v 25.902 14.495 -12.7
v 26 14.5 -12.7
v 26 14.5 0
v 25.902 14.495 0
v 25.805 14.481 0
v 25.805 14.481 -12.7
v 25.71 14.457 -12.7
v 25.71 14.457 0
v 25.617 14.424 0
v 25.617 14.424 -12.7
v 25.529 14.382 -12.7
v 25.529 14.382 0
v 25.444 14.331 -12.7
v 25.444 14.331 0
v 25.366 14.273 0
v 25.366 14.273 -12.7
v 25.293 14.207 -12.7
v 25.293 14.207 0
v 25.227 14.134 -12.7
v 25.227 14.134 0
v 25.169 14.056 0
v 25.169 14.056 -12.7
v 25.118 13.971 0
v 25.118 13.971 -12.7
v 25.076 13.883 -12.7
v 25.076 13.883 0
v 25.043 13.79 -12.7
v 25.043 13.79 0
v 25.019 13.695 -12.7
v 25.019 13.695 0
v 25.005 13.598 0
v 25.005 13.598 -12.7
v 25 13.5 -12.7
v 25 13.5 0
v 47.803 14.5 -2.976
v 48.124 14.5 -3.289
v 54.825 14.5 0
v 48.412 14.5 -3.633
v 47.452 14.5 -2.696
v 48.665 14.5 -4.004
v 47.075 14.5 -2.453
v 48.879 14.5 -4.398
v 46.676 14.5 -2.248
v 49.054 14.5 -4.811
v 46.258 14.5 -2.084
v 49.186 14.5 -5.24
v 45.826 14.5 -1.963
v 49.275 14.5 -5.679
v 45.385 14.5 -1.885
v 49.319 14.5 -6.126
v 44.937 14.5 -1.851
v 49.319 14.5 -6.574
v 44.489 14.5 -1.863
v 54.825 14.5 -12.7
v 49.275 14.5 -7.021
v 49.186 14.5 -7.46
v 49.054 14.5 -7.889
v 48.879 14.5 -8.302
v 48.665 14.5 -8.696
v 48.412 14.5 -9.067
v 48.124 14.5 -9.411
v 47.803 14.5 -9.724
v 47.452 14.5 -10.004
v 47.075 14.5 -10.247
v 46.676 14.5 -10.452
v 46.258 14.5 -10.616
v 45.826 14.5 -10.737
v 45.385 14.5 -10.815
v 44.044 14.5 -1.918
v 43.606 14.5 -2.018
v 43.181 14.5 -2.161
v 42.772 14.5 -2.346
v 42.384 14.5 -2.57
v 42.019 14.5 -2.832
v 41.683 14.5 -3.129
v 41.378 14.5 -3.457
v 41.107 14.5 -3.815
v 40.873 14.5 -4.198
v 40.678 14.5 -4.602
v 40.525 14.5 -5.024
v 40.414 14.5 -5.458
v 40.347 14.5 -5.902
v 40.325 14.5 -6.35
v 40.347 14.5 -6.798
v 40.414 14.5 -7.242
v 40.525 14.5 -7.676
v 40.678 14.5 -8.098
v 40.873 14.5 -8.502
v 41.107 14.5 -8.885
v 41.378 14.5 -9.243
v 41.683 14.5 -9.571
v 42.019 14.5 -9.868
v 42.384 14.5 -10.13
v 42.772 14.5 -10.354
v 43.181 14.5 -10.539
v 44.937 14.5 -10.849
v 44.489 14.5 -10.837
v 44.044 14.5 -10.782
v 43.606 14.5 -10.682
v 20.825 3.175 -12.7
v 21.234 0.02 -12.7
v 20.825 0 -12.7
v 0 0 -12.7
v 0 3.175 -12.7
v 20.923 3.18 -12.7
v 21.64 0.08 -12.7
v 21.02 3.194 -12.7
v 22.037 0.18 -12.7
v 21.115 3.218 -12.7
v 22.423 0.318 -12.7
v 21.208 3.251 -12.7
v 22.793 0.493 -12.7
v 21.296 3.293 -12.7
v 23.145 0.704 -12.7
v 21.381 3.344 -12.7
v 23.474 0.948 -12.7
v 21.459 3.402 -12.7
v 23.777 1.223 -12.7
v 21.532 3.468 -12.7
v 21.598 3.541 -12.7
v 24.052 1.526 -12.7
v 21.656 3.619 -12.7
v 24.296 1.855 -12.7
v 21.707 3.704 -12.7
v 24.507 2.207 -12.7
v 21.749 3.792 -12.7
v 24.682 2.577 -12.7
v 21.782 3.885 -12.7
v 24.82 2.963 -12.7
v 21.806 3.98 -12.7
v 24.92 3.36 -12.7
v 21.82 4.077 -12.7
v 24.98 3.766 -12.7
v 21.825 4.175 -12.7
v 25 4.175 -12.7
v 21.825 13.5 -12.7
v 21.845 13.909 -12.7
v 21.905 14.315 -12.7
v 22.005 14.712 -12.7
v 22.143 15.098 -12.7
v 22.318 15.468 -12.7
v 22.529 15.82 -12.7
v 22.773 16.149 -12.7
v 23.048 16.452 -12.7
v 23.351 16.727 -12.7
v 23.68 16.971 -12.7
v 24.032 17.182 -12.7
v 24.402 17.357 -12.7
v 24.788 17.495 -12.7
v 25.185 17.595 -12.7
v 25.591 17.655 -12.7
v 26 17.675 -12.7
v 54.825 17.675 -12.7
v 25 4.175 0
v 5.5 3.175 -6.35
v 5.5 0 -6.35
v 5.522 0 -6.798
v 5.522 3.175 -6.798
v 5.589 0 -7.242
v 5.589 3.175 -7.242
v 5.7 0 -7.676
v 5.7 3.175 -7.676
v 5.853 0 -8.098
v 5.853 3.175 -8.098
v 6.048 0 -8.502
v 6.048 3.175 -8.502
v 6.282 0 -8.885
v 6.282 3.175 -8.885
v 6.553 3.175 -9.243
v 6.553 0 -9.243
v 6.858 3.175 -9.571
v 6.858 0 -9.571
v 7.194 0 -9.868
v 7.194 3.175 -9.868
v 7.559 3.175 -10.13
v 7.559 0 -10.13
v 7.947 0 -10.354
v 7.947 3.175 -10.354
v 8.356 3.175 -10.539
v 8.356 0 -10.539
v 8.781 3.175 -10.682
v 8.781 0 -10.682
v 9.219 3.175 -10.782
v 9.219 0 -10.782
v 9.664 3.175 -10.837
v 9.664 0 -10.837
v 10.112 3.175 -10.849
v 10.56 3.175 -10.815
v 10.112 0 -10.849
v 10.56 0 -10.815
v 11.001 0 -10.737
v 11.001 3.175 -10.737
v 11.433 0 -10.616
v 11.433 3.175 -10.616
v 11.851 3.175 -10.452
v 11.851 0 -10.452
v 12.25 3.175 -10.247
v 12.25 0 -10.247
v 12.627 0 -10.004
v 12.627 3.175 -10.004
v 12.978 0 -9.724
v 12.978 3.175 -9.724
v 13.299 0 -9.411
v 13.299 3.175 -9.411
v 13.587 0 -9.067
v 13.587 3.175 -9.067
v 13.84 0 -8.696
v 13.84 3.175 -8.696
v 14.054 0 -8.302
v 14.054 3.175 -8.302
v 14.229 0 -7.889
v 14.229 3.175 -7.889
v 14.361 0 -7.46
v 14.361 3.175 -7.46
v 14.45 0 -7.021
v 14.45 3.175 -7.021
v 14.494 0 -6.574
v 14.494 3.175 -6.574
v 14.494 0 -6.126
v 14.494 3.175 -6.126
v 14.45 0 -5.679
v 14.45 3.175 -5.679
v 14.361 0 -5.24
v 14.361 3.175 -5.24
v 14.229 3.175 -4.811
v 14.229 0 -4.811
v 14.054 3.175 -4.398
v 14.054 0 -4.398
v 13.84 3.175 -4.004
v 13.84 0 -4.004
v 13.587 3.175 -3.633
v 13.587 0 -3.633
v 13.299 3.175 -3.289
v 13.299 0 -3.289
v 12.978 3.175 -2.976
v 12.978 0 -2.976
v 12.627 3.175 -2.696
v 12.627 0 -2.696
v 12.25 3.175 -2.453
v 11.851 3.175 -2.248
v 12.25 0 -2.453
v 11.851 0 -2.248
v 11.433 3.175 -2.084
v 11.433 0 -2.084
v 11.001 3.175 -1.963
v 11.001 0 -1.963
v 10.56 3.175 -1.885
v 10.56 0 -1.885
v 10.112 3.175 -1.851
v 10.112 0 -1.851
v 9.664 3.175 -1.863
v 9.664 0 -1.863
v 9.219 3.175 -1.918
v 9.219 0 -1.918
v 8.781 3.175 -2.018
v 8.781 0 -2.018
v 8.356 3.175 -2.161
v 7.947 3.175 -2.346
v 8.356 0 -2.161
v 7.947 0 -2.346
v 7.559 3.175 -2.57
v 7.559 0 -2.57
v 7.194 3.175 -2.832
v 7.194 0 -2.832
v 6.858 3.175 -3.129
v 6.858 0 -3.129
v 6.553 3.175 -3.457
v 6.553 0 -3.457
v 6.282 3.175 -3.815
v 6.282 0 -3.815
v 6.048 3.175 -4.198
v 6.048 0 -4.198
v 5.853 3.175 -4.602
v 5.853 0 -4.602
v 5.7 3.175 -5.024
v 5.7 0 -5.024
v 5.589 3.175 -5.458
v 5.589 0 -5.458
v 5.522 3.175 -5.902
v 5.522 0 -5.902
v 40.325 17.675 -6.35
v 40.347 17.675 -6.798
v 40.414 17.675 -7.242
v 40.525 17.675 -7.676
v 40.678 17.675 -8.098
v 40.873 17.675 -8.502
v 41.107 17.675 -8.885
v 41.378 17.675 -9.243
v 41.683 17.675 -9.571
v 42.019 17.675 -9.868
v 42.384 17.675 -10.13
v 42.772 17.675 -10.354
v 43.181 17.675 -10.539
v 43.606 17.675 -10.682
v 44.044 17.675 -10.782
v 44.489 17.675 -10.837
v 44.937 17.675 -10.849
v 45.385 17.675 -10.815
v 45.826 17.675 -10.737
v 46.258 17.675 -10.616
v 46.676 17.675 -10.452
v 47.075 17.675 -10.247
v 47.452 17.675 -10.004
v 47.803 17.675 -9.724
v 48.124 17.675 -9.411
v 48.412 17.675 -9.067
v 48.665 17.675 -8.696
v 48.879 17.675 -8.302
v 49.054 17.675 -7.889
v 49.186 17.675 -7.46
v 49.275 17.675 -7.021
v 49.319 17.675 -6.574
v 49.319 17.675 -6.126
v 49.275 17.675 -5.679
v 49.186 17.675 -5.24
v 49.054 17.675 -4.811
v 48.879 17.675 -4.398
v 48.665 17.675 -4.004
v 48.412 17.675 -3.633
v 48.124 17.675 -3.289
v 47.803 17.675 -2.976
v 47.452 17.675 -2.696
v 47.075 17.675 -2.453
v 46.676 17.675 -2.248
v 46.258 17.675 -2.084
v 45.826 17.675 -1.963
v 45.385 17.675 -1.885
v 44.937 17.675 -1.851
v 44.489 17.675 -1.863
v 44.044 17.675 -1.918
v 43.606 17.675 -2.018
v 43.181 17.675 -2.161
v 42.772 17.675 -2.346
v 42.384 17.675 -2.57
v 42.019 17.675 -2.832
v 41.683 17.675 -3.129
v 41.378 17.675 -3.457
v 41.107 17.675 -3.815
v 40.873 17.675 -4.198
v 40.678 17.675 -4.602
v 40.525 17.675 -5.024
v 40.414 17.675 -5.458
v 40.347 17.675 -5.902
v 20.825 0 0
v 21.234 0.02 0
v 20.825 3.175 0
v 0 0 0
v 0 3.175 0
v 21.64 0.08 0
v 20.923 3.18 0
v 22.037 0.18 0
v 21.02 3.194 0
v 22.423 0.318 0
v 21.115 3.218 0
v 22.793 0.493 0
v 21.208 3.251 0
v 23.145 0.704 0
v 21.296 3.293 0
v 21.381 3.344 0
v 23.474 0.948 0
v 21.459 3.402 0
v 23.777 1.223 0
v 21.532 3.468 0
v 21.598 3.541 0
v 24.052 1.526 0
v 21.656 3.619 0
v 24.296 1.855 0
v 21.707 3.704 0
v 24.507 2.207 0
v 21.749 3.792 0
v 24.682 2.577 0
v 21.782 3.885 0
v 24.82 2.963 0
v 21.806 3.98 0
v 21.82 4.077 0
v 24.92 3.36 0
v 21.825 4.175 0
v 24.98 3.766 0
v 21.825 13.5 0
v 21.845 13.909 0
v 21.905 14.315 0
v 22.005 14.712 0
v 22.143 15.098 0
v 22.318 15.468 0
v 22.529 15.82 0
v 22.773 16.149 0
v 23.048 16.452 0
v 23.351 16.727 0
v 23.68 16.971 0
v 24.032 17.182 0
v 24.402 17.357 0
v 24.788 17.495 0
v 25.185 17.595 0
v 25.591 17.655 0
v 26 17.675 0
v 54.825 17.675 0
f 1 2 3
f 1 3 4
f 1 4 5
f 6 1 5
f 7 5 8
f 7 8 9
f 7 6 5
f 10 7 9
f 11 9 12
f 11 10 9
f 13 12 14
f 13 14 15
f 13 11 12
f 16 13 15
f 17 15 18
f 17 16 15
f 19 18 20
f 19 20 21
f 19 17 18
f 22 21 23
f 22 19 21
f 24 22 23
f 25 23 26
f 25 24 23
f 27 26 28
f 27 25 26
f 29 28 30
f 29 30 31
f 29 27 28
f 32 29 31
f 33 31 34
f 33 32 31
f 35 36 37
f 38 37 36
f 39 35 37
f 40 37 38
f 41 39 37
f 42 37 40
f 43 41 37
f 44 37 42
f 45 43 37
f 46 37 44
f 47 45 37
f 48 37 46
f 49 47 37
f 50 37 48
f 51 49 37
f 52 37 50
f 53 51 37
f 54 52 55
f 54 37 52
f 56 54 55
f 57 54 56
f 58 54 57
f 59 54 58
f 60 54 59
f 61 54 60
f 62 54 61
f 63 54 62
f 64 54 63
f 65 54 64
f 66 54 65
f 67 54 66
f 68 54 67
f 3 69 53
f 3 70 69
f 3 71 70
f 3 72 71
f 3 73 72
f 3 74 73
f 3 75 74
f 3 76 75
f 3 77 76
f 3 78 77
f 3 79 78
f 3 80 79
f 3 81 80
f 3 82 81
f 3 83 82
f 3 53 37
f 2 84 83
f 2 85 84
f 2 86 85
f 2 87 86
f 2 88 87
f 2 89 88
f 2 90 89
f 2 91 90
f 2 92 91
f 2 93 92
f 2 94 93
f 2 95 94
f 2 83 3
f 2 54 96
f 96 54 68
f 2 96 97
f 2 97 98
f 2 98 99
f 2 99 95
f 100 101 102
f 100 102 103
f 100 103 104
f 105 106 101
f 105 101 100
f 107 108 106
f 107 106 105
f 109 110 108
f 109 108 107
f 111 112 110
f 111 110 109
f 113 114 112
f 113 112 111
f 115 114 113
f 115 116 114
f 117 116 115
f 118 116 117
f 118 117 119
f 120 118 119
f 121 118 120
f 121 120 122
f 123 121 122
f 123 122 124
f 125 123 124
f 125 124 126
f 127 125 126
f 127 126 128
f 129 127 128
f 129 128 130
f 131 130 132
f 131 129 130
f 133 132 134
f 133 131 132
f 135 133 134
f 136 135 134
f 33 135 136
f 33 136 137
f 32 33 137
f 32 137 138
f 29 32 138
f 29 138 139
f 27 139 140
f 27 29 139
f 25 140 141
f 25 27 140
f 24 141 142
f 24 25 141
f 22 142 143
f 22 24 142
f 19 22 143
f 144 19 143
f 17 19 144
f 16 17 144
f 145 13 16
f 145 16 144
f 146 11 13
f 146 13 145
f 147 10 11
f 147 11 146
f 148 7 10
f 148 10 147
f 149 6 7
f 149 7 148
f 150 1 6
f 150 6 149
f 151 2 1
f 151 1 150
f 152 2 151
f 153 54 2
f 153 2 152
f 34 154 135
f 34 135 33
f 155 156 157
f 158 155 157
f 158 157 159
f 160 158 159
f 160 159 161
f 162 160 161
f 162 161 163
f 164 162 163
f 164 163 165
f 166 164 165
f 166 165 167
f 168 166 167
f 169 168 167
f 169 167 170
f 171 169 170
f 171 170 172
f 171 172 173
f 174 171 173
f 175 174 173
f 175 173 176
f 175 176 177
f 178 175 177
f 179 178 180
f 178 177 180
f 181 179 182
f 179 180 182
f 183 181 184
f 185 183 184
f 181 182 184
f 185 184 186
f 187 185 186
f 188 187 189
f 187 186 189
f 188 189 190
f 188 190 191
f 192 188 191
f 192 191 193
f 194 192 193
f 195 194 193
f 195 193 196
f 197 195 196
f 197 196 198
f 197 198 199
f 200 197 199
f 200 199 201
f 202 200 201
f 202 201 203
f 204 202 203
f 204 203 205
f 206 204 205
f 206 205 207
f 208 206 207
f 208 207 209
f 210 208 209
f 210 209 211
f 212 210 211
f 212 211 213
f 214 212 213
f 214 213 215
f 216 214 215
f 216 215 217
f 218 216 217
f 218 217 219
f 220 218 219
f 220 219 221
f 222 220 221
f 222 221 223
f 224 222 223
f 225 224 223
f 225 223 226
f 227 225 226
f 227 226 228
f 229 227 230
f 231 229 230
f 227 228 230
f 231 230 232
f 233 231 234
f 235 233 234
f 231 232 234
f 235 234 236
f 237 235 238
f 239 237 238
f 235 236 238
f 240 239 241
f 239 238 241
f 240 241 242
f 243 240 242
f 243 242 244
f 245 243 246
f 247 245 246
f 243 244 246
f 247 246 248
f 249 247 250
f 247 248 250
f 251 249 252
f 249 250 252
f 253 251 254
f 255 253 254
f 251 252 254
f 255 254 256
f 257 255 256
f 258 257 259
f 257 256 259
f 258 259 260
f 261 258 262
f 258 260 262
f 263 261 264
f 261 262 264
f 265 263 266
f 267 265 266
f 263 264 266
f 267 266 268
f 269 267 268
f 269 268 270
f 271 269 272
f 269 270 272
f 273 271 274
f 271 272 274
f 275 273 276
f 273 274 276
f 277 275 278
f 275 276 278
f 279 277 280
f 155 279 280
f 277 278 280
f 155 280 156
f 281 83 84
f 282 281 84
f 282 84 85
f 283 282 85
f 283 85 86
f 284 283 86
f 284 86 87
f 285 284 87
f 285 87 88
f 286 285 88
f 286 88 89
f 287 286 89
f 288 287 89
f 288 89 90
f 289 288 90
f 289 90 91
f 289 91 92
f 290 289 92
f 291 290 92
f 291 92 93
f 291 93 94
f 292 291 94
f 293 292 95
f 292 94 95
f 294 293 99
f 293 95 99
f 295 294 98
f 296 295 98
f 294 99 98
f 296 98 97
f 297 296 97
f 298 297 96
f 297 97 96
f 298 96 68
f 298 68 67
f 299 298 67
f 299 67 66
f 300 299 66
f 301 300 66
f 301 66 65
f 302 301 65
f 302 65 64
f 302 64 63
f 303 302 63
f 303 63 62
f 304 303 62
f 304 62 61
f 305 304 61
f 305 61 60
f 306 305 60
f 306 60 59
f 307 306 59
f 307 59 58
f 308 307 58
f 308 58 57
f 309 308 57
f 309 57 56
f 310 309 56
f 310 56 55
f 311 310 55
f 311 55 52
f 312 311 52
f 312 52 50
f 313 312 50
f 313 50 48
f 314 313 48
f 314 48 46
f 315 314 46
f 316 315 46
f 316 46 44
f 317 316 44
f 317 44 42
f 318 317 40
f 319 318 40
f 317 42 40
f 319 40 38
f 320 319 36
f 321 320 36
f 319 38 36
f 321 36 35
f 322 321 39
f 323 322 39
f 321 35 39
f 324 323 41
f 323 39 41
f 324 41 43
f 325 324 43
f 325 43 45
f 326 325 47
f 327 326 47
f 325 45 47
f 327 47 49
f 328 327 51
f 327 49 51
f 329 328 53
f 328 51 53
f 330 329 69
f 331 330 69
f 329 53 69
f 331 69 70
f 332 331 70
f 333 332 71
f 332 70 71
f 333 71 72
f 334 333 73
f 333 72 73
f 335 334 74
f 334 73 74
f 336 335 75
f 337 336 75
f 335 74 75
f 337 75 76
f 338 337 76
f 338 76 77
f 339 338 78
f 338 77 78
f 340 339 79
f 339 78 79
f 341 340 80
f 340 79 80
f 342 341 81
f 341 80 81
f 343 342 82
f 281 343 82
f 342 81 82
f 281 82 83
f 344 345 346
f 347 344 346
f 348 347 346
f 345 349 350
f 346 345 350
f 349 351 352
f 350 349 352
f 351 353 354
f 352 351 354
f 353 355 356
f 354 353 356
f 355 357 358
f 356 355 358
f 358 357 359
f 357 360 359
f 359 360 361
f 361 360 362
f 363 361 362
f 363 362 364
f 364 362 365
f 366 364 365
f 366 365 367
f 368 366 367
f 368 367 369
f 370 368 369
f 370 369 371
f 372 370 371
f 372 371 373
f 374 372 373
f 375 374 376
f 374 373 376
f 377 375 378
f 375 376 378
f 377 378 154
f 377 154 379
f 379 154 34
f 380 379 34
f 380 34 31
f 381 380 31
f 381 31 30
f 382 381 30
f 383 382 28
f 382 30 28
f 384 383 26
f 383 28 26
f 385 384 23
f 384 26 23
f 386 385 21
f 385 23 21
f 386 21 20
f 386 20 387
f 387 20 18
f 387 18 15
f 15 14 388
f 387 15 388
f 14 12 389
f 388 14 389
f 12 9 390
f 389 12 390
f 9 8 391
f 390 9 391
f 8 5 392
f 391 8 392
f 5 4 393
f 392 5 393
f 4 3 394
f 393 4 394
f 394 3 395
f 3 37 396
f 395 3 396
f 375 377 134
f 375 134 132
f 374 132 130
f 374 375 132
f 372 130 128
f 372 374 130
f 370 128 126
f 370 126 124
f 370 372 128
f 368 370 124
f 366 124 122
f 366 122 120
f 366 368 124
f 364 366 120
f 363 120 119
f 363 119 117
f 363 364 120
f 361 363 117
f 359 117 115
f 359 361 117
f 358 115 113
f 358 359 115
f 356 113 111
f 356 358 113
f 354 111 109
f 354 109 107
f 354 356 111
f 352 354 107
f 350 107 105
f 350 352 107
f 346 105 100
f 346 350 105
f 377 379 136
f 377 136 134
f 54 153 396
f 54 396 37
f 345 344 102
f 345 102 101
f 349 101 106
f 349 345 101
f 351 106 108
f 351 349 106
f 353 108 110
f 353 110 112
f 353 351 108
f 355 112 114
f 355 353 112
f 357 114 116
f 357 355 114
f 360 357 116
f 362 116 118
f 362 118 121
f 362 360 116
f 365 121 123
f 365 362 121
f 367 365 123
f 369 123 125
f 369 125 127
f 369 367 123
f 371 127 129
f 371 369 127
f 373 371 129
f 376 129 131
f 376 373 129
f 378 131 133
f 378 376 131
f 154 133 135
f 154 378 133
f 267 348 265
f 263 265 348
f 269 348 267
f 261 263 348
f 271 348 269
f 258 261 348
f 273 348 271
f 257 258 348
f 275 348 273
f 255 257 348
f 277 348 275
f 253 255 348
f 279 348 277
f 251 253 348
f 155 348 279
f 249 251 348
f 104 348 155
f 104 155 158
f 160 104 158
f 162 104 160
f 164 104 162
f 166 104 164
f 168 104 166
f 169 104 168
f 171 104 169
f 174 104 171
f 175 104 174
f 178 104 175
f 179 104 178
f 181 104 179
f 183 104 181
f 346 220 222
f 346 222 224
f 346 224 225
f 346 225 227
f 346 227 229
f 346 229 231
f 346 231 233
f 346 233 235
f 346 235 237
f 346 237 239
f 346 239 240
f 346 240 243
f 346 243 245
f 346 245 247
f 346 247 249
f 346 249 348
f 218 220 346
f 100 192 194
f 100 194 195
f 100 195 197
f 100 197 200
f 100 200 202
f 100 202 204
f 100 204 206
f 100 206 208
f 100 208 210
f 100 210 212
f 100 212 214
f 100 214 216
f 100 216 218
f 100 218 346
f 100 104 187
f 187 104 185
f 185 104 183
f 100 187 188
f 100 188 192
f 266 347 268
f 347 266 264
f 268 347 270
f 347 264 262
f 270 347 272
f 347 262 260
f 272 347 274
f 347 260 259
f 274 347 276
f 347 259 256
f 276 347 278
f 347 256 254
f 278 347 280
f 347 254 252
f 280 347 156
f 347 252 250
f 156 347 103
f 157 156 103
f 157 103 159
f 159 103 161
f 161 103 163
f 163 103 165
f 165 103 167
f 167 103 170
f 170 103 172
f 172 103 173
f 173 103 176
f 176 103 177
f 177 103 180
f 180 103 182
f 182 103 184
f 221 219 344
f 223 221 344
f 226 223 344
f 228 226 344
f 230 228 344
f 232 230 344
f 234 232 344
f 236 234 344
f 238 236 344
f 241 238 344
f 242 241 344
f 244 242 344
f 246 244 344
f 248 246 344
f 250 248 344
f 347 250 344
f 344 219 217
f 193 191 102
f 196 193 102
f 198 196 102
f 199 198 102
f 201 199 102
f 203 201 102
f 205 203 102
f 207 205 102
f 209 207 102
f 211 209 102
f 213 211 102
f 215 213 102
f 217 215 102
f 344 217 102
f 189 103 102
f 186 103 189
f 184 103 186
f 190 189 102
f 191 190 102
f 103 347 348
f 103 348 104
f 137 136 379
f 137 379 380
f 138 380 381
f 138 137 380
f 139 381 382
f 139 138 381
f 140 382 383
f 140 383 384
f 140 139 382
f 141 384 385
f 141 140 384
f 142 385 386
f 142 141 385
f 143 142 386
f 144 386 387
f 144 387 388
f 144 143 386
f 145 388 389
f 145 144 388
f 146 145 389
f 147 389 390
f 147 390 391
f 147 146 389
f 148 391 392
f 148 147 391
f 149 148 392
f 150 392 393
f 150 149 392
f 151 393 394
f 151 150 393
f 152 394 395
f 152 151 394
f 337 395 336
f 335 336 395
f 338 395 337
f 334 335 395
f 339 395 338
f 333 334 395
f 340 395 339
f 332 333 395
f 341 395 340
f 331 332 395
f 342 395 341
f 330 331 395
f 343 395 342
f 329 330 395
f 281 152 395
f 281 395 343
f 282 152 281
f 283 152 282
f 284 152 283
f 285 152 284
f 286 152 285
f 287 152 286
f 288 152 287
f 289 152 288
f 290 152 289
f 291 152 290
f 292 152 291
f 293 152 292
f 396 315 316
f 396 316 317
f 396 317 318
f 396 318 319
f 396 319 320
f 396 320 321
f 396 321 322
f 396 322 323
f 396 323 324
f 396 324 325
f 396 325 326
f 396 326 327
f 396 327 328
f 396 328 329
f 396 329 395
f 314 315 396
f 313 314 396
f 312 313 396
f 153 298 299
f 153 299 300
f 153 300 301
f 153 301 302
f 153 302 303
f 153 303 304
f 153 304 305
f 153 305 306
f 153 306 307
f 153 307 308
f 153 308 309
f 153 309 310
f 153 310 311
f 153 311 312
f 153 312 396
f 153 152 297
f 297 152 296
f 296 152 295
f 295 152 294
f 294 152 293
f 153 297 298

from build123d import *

# Parameters (mm, degrees)
SKETCH1_W                    = 25
SKETCH1_H                    = 12.7
BOSS_EXTRUDE1_DEPTH          = 3.175
EDGE_FLANGE1_STRIP_W         = 14.7
EDGE_FLANGE1_STRIP_H         = 3.175
EDGE_FLANGE1_STRIP_CUT_DEPTH = 12.7
EDGE_FLANGE1_DEPTH           = 12.7
EDGE_FLANGE2_STRIP_W         = 14.7
EDGE_FLANGE2_STRIP_H         = 3.175
EDGE_FLANGE2_STRIP_CUT_DEPTH = 12.7
EDGE_FLANGE2_DEPTH           = 12.7
M8_CLEARANCE_HOLE1_D         = 9


# Sheet-metal steps are written as plain solids
with BuildPart() as part:
    # Sketch1 → Boss-Extrude1 (new body)
    with BuildSketch(Plane(origin=(0, 0, 0), x_dir=(1, 0, 0), z_dir=(0, 1, 0))):
        with Locations((12.5, 6.35)):
            Rectangle(SKETCH1_W, SKETCH1_H)
    extrude(amount=BOSS_EXTRUDE1_DEPTH)

    # Edge-Flange1 strip (across the edge) → Edge-Flange1 strip cut (cut)
    with BuildSketch(Plane(origin=(25, 3.175, 0), x_dir=(-1, 0, 0), z_dir=(0, 0, -1))):
        with Locations((-3.175, -1.5875)):
            Rectangle(EDGE_FLANGE1_STRIP_W, EDGE_FLANGE1_STRIP_H)
    extrude(amount=EDGE_FLANGE1_STRIP_CUT_DEPTH, mode=Mode.SUBTRACT)

    # Edge-Flange1 section (across the edge) → Edge-Flange1 (add)
    with BuildSketch(Plane(origin=(25, 3.175, 0), x_dir=(-1, 0, 0), z_dir=(0, 0, -1))):
        with BuildLine():
            Line((0, 1), (0, 11.325))
            Line((0, 11.325), (3.175, 11.325))
            Line((3.175, 11.325), (3.175, 1))
            ThreePointArc((3.175, 1), (3.467893219, 0.292893219), (4.175, 0))
            Line((4.175, 0), (4.175, -3.175))
            ThreePointArc((4.175, -3.175), (1.222829189, -1.952170811), (0, 1))
        make_face()
    extrude(amount=EDGE_FLANGE1_DEPTH)

    # Edge-Flange2 strip (across the edge) → Edge-Flange2 strip cut (cut)
    with BuildSketch(Plane(origin=(25, 14.5, -12.7), x_dir=(0, -1, 0), z_dir=(0, 0, 1))):
        with Locations((-6.35, -1.5875)):
            Rectangle(EDGE_FLANGE2_STRIP_W, EDGE_FLANGE2_STRIP_H)
    extrude(amount=EDGE_FLANGE2_STRIP_CUT_DEPTH, mode=Mode.SUBTRACT)

    # Edge-Flange2 section (across the edge) → Edge-Flange2 (add)
    with BuildSketch(Plane(origin=(25, 14.5, -12.7), x_dir=(0, -1, 0), z_dir=(0, 0, 1))):
        with BuildLine():
            Line((-3.175, 1), (-3.175, 29.825))
            Line((-3.175, 29.825), (0, 29.825))
            Line((0, 29.825), (0, 1))
            ThreePointArc((0, 1), (0.292893219, 0.292893219), (1, 0))
            Line((1, 0), (1, -3.175))
            ThreePointArc((1, -3.175), (-1.952170811, -1.952170811), (-3.175, 1))
        make_face()
    extrude(amount=EDGE_FLANGE2_DEPTH)

    # M8 Clearance Hole1 (through all)
    with Locations(Plane(origin=(0, 17.675, 0), x_dir=(1, 0, 0), z_dir=(0, 1, 0))):
        with Locations((44.825, 6.35), (10, 6.35)):
            Hole(M8_CLEARANCE_HOLE1_D / 2)


solid = part.part
